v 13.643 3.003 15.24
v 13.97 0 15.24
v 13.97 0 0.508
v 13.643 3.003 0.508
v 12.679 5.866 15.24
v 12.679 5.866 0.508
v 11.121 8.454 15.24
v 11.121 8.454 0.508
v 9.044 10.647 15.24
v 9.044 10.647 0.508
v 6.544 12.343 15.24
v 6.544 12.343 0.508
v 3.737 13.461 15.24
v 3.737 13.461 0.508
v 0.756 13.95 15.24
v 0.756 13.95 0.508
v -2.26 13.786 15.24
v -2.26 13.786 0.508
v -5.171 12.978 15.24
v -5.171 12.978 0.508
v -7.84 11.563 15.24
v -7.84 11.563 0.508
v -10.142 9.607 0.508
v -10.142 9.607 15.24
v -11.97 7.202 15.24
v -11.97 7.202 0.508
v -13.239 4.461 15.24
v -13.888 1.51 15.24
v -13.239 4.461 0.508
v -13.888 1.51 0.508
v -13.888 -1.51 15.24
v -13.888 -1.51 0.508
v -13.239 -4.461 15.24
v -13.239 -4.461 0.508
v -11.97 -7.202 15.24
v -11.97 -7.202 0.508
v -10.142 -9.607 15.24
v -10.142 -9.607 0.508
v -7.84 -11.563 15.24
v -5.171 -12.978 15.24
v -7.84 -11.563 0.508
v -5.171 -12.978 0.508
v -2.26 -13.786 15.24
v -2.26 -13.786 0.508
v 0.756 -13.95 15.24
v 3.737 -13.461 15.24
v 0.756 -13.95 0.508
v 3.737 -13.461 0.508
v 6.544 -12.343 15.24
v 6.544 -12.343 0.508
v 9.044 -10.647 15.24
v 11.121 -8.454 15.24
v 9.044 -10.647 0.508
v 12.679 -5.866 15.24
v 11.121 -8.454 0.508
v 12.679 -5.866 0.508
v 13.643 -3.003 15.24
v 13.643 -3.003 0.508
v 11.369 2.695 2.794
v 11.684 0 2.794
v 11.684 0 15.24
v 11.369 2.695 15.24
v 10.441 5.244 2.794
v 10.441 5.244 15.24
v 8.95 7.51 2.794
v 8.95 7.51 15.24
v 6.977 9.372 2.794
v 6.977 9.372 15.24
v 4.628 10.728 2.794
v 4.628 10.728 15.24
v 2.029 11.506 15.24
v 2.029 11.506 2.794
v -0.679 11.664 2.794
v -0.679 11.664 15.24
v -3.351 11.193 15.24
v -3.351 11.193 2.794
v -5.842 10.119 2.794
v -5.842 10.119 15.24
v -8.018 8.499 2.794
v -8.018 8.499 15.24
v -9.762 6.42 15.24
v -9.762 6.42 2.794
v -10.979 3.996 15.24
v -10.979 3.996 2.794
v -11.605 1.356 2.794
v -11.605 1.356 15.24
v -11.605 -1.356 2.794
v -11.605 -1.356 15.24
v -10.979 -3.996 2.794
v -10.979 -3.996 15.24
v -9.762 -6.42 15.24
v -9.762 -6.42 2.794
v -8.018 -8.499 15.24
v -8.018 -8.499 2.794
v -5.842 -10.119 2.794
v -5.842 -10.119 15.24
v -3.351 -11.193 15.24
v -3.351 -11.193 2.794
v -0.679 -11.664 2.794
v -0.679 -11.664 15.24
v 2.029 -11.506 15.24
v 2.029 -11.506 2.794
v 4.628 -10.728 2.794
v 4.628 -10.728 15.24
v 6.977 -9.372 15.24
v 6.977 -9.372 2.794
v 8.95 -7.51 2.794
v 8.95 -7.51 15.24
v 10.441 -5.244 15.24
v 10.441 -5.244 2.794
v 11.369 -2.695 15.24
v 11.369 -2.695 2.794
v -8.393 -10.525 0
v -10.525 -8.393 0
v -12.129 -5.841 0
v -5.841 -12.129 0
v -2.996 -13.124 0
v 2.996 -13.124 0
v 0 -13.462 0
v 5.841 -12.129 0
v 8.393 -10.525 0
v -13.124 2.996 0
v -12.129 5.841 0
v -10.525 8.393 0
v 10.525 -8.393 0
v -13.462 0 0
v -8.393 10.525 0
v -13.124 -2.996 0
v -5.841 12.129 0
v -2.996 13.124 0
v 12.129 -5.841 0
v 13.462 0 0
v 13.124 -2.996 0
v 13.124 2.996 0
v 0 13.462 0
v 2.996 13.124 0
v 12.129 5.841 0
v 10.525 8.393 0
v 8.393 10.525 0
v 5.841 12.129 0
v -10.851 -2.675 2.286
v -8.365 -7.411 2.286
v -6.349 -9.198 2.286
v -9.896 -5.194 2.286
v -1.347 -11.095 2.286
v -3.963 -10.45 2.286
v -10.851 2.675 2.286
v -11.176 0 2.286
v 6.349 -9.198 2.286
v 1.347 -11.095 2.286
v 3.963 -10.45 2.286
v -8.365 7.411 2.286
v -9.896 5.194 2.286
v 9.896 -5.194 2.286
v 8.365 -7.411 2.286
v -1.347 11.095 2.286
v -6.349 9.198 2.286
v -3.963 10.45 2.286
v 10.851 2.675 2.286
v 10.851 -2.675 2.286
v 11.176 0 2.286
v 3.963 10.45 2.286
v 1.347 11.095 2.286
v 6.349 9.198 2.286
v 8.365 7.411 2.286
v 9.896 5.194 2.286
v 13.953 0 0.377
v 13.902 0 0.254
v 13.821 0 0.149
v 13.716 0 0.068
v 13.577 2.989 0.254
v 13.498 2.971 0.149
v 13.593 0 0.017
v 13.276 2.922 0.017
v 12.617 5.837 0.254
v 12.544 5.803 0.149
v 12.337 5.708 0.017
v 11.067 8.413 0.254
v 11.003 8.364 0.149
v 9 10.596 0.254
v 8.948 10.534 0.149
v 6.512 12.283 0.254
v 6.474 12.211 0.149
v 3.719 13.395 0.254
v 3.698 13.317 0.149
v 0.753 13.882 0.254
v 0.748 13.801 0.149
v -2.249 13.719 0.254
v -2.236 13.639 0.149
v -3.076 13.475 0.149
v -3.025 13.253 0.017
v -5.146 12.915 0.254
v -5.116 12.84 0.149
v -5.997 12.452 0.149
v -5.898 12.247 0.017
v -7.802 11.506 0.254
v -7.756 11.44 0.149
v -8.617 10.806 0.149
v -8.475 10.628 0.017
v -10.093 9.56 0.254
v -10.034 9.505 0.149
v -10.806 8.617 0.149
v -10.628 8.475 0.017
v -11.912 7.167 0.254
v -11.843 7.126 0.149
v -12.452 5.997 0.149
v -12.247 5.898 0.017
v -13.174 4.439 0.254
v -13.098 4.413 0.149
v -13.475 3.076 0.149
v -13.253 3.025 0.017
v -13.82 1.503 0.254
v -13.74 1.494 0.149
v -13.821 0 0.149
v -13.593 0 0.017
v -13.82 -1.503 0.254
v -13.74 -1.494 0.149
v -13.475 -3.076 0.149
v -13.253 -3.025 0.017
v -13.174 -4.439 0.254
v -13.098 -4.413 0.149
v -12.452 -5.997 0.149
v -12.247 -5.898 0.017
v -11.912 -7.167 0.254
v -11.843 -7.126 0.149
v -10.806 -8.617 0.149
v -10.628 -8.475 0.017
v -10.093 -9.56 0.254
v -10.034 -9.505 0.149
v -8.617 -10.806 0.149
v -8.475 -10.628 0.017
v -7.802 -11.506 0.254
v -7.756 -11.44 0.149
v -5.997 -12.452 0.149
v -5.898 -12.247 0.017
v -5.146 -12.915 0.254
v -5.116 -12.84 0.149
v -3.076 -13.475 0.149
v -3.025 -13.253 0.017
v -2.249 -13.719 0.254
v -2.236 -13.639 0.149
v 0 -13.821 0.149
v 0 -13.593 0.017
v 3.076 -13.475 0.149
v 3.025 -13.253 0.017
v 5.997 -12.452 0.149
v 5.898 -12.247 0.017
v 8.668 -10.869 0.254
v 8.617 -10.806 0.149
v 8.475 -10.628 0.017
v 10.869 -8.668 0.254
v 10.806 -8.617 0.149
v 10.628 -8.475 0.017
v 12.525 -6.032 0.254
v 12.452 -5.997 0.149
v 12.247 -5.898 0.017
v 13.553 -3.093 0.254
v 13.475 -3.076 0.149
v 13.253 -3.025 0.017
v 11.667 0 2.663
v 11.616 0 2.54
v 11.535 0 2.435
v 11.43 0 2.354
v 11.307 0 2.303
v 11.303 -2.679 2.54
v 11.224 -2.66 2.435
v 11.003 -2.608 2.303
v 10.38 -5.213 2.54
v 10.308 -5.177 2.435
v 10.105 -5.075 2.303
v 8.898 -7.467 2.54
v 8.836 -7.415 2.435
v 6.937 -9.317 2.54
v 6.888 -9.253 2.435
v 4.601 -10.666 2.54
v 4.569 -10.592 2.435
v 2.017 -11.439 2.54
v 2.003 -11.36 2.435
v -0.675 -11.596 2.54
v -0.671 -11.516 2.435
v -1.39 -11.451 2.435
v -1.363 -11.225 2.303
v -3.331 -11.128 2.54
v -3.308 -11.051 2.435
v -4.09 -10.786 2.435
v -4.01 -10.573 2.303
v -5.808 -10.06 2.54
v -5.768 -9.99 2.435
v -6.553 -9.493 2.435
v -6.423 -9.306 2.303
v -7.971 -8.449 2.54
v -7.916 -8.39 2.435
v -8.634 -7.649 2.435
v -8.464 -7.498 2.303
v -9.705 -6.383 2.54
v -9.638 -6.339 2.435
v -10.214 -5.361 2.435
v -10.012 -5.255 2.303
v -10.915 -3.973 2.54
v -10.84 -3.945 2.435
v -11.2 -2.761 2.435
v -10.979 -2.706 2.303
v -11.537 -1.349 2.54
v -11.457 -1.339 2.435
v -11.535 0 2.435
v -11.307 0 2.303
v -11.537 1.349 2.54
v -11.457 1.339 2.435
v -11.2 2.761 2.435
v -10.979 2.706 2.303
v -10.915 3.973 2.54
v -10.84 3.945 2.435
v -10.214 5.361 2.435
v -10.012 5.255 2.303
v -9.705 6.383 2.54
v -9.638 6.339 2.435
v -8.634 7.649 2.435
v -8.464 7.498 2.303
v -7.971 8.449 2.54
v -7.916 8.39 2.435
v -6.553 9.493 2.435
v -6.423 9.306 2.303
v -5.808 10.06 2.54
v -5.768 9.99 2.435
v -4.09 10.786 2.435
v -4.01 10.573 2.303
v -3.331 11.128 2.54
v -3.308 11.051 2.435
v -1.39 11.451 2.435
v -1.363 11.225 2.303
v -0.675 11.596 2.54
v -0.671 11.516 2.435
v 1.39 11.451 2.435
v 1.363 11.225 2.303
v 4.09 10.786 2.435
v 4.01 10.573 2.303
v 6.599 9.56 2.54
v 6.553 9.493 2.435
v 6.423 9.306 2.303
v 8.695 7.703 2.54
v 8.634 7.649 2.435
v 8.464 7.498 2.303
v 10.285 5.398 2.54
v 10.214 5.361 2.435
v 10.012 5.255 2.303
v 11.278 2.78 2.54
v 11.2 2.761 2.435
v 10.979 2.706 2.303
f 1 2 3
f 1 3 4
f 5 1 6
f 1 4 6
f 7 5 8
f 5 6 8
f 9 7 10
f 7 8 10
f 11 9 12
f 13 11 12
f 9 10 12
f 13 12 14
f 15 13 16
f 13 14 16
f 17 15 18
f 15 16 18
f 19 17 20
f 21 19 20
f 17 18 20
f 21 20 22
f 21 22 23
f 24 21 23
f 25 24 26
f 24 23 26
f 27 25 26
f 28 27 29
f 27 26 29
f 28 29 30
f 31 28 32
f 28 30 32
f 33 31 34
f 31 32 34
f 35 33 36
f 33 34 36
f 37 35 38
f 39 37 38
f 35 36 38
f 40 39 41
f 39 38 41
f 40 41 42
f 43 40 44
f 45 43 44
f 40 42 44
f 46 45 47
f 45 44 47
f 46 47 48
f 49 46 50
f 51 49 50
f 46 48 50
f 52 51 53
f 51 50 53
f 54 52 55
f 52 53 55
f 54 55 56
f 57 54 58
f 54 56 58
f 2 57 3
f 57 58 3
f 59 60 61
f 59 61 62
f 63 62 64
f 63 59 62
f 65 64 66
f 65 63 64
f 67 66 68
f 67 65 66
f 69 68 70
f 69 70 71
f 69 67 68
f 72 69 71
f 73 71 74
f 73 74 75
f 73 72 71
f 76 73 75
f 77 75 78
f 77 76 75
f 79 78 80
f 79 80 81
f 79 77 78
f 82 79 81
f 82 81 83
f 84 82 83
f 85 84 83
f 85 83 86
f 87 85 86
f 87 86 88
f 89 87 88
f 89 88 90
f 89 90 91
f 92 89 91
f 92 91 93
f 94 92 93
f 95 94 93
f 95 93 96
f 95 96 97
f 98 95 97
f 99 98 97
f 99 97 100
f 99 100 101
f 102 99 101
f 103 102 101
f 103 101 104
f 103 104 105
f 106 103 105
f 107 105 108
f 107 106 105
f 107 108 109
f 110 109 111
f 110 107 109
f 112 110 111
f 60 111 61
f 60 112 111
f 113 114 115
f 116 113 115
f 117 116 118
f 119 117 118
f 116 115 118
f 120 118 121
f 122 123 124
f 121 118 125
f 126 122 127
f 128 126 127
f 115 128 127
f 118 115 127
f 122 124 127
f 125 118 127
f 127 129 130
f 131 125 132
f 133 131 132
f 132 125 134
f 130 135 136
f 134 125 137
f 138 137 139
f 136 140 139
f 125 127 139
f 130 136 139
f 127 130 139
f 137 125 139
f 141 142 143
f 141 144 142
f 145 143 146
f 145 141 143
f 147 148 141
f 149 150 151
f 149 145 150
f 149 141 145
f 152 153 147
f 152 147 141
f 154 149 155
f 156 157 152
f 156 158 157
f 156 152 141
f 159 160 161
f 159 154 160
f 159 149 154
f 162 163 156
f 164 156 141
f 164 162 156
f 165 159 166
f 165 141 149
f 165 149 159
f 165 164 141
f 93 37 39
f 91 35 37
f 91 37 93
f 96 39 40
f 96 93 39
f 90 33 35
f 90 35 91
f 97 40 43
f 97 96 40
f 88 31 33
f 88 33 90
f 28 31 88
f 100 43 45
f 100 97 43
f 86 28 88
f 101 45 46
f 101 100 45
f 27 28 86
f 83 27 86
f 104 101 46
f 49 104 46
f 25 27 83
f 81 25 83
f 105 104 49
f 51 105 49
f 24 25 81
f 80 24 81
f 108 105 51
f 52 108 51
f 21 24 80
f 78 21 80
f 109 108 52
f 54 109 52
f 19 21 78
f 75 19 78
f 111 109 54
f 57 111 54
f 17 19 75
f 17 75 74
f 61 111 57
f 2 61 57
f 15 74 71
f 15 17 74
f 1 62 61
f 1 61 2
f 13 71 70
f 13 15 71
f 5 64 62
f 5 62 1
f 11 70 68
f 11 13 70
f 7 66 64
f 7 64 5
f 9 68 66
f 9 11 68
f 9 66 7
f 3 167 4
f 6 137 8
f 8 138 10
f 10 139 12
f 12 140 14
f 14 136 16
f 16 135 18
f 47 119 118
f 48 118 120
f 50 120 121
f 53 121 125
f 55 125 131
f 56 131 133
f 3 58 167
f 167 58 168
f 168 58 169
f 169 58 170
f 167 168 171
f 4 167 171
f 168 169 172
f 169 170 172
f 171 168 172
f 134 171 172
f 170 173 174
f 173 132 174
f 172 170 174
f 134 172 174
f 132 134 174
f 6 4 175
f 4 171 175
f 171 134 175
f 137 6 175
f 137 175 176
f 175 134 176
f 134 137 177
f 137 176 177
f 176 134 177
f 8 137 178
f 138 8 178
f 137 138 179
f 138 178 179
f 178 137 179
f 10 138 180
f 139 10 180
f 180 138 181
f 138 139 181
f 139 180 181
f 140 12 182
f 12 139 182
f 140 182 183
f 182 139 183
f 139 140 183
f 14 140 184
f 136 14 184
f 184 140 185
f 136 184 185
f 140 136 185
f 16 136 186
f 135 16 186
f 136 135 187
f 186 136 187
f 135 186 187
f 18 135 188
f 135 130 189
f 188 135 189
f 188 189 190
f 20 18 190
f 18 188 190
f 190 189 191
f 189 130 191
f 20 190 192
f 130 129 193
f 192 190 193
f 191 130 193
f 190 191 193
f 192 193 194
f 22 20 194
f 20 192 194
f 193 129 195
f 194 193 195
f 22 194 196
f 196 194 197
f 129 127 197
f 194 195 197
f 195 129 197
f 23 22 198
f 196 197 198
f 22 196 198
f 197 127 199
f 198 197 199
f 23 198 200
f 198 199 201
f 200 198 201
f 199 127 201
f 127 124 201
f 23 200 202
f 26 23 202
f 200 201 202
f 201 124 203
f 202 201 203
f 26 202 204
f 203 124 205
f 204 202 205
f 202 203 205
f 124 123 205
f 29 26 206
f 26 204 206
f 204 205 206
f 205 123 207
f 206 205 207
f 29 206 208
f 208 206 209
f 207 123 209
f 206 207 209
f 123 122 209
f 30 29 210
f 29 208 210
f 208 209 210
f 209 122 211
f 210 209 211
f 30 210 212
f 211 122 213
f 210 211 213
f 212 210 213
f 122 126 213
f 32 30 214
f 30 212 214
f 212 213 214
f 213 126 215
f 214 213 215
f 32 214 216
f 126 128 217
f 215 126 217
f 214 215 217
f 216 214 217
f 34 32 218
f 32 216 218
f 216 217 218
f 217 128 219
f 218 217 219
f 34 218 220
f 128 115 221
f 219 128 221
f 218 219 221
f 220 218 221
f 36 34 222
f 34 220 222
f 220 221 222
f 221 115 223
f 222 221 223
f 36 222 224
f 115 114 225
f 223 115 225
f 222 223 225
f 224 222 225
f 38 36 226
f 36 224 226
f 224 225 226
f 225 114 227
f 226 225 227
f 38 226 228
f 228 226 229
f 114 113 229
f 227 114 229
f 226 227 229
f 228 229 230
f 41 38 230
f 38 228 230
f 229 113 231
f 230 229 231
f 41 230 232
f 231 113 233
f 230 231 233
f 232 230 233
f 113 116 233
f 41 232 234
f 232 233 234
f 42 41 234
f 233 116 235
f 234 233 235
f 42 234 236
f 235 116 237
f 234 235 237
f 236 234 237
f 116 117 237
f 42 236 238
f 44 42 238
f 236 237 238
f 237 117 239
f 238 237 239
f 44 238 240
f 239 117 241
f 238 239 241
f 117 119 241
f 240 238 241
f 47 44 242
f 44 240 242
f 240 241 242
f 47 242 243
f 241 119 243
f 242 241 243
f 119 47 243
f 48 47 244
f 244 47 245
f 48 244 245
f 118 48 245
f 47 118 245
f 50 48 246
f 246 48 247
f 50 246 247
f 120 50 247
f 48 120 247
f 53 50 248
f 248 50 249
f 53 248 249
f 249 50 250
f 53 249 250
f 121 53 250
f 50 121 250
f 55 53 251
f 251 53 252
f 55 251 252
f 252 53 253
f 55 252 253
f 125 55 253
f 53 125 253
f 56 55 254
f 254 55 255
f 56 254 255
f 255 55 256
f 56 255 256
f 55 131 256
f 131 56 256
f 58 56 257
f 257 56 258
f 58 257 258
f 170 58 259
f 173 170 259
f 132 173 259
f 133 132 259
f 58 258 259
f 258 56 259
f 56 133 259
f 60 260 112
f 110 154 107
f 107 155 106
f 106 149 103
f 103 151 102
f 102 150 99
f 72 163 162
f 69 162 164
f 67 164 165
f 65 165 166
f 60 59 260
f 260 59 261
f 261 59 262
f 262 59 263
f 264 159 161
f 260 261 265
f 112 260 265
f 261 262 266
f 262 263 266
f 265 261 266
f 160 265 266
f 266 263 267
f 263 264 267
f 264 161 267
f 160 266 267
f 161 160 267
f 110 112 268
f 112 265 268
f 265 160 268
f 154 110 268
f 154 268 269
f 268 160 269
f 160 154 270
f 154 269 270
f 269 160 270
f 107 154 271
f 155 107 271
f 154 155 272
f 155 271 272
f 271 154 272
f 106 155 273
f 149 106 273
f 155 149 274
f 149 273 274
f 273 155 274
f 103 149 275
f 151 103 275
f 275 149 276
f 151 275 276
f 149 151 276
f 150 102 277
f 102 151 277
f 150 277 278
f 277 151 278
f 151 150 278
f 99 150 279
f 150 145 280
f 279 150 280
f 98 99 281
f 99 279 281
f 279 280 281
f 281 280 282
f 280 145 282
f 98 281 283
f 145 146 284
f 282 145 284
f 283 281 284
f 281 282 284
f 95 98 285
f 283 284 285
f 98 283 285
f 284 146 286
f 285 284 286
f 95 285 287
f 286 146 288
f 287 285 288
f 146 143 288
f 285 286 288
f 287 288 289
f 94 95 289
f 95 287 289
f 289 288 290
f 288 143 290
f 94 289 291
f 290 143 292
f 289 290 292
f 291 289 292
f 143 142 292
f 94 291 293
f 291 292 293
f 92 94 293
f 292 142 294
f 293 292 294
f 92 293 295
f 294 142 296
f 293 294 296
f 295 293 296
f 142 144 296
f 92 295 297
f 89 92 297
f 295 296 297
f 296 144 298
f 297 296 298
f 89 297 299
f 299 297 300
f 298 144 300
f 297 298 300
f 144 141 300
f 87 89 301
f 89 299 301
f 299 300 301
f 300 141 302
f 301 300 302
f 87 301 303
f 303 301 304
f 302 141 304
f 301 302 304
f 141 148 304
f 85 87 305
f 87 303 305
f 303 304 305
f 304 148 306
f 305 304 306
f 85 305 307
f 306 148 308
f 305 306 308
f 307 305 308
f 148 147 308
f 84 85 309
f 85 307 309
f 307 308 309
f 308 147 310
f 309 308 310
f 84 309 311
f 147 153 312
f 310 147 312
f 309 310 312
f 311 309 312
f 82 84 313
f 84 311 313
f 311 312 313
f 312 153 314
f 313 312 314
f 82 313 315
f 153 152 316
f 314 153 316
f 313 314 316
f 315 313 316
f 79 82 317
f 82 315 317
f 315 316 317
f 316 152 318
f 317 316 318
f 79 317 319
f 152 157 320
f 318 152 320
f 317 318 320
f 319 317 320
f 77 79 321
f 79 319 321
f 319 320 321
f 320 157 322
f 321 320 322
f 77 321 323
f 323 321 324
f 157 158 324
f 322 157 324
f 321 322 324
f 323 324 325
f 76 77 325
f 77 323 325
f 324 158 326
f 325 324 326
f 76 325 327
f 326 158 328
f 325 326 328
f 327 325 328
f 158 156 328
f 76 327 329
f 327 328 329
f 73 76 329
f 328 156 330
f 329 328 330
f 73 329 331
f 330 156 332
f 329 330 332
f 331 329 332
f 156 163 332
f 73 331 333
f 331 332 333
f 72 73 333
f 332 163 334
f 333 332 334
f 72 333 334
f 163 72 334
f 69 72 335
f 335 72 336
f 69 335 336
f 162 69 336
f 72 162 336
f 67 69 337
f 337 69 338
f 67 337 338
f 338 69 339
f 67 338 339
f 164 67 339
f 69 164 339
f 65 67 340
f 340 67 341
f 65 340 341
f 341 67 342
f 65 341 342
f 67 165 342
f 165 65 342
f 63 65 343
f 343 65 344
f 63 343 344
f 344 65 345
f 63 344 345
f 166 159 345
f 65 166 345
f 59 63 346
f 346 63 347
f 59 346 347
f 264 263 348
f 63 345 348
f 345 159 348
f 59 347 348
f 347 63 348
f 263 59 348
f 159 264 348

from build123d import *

# Parameters (mm, degrees)
F0_R     = 13.97
F1_DEPTH = 15.24
F2_T     = -2.286
F3_R     = 0.508
F4_R     = 0.508


with BuildPart() as f1:
    # F0 (on Top) → F1 (new body)
    with BuildSketch(Plane.XY):
        Circle(F0_R)
    extrude(amount=F1_DEPTH)

    # F2
    f2_openings = [f1.faces().sort_by_distance(p)[0] for p in [
        (0, 0, 15.24),
    ]]
    offset(amount=F2_T, openings=f2_openings)

    # F3
    f3_edges = [f1.edges().sort_by_distance(p)[0] for p in [
        (-11.684, 0, 2.286),
    ]]
    fillet(f3_edges, radius=F3_R)

    # F4
    f4_edges = [f1.edges().sort_by_distance(p)[0] for p in [
        (-13.97, 0, 0),
    ]]
    fillet(f4_edges, radius=F4_R)


solid = f1.part
